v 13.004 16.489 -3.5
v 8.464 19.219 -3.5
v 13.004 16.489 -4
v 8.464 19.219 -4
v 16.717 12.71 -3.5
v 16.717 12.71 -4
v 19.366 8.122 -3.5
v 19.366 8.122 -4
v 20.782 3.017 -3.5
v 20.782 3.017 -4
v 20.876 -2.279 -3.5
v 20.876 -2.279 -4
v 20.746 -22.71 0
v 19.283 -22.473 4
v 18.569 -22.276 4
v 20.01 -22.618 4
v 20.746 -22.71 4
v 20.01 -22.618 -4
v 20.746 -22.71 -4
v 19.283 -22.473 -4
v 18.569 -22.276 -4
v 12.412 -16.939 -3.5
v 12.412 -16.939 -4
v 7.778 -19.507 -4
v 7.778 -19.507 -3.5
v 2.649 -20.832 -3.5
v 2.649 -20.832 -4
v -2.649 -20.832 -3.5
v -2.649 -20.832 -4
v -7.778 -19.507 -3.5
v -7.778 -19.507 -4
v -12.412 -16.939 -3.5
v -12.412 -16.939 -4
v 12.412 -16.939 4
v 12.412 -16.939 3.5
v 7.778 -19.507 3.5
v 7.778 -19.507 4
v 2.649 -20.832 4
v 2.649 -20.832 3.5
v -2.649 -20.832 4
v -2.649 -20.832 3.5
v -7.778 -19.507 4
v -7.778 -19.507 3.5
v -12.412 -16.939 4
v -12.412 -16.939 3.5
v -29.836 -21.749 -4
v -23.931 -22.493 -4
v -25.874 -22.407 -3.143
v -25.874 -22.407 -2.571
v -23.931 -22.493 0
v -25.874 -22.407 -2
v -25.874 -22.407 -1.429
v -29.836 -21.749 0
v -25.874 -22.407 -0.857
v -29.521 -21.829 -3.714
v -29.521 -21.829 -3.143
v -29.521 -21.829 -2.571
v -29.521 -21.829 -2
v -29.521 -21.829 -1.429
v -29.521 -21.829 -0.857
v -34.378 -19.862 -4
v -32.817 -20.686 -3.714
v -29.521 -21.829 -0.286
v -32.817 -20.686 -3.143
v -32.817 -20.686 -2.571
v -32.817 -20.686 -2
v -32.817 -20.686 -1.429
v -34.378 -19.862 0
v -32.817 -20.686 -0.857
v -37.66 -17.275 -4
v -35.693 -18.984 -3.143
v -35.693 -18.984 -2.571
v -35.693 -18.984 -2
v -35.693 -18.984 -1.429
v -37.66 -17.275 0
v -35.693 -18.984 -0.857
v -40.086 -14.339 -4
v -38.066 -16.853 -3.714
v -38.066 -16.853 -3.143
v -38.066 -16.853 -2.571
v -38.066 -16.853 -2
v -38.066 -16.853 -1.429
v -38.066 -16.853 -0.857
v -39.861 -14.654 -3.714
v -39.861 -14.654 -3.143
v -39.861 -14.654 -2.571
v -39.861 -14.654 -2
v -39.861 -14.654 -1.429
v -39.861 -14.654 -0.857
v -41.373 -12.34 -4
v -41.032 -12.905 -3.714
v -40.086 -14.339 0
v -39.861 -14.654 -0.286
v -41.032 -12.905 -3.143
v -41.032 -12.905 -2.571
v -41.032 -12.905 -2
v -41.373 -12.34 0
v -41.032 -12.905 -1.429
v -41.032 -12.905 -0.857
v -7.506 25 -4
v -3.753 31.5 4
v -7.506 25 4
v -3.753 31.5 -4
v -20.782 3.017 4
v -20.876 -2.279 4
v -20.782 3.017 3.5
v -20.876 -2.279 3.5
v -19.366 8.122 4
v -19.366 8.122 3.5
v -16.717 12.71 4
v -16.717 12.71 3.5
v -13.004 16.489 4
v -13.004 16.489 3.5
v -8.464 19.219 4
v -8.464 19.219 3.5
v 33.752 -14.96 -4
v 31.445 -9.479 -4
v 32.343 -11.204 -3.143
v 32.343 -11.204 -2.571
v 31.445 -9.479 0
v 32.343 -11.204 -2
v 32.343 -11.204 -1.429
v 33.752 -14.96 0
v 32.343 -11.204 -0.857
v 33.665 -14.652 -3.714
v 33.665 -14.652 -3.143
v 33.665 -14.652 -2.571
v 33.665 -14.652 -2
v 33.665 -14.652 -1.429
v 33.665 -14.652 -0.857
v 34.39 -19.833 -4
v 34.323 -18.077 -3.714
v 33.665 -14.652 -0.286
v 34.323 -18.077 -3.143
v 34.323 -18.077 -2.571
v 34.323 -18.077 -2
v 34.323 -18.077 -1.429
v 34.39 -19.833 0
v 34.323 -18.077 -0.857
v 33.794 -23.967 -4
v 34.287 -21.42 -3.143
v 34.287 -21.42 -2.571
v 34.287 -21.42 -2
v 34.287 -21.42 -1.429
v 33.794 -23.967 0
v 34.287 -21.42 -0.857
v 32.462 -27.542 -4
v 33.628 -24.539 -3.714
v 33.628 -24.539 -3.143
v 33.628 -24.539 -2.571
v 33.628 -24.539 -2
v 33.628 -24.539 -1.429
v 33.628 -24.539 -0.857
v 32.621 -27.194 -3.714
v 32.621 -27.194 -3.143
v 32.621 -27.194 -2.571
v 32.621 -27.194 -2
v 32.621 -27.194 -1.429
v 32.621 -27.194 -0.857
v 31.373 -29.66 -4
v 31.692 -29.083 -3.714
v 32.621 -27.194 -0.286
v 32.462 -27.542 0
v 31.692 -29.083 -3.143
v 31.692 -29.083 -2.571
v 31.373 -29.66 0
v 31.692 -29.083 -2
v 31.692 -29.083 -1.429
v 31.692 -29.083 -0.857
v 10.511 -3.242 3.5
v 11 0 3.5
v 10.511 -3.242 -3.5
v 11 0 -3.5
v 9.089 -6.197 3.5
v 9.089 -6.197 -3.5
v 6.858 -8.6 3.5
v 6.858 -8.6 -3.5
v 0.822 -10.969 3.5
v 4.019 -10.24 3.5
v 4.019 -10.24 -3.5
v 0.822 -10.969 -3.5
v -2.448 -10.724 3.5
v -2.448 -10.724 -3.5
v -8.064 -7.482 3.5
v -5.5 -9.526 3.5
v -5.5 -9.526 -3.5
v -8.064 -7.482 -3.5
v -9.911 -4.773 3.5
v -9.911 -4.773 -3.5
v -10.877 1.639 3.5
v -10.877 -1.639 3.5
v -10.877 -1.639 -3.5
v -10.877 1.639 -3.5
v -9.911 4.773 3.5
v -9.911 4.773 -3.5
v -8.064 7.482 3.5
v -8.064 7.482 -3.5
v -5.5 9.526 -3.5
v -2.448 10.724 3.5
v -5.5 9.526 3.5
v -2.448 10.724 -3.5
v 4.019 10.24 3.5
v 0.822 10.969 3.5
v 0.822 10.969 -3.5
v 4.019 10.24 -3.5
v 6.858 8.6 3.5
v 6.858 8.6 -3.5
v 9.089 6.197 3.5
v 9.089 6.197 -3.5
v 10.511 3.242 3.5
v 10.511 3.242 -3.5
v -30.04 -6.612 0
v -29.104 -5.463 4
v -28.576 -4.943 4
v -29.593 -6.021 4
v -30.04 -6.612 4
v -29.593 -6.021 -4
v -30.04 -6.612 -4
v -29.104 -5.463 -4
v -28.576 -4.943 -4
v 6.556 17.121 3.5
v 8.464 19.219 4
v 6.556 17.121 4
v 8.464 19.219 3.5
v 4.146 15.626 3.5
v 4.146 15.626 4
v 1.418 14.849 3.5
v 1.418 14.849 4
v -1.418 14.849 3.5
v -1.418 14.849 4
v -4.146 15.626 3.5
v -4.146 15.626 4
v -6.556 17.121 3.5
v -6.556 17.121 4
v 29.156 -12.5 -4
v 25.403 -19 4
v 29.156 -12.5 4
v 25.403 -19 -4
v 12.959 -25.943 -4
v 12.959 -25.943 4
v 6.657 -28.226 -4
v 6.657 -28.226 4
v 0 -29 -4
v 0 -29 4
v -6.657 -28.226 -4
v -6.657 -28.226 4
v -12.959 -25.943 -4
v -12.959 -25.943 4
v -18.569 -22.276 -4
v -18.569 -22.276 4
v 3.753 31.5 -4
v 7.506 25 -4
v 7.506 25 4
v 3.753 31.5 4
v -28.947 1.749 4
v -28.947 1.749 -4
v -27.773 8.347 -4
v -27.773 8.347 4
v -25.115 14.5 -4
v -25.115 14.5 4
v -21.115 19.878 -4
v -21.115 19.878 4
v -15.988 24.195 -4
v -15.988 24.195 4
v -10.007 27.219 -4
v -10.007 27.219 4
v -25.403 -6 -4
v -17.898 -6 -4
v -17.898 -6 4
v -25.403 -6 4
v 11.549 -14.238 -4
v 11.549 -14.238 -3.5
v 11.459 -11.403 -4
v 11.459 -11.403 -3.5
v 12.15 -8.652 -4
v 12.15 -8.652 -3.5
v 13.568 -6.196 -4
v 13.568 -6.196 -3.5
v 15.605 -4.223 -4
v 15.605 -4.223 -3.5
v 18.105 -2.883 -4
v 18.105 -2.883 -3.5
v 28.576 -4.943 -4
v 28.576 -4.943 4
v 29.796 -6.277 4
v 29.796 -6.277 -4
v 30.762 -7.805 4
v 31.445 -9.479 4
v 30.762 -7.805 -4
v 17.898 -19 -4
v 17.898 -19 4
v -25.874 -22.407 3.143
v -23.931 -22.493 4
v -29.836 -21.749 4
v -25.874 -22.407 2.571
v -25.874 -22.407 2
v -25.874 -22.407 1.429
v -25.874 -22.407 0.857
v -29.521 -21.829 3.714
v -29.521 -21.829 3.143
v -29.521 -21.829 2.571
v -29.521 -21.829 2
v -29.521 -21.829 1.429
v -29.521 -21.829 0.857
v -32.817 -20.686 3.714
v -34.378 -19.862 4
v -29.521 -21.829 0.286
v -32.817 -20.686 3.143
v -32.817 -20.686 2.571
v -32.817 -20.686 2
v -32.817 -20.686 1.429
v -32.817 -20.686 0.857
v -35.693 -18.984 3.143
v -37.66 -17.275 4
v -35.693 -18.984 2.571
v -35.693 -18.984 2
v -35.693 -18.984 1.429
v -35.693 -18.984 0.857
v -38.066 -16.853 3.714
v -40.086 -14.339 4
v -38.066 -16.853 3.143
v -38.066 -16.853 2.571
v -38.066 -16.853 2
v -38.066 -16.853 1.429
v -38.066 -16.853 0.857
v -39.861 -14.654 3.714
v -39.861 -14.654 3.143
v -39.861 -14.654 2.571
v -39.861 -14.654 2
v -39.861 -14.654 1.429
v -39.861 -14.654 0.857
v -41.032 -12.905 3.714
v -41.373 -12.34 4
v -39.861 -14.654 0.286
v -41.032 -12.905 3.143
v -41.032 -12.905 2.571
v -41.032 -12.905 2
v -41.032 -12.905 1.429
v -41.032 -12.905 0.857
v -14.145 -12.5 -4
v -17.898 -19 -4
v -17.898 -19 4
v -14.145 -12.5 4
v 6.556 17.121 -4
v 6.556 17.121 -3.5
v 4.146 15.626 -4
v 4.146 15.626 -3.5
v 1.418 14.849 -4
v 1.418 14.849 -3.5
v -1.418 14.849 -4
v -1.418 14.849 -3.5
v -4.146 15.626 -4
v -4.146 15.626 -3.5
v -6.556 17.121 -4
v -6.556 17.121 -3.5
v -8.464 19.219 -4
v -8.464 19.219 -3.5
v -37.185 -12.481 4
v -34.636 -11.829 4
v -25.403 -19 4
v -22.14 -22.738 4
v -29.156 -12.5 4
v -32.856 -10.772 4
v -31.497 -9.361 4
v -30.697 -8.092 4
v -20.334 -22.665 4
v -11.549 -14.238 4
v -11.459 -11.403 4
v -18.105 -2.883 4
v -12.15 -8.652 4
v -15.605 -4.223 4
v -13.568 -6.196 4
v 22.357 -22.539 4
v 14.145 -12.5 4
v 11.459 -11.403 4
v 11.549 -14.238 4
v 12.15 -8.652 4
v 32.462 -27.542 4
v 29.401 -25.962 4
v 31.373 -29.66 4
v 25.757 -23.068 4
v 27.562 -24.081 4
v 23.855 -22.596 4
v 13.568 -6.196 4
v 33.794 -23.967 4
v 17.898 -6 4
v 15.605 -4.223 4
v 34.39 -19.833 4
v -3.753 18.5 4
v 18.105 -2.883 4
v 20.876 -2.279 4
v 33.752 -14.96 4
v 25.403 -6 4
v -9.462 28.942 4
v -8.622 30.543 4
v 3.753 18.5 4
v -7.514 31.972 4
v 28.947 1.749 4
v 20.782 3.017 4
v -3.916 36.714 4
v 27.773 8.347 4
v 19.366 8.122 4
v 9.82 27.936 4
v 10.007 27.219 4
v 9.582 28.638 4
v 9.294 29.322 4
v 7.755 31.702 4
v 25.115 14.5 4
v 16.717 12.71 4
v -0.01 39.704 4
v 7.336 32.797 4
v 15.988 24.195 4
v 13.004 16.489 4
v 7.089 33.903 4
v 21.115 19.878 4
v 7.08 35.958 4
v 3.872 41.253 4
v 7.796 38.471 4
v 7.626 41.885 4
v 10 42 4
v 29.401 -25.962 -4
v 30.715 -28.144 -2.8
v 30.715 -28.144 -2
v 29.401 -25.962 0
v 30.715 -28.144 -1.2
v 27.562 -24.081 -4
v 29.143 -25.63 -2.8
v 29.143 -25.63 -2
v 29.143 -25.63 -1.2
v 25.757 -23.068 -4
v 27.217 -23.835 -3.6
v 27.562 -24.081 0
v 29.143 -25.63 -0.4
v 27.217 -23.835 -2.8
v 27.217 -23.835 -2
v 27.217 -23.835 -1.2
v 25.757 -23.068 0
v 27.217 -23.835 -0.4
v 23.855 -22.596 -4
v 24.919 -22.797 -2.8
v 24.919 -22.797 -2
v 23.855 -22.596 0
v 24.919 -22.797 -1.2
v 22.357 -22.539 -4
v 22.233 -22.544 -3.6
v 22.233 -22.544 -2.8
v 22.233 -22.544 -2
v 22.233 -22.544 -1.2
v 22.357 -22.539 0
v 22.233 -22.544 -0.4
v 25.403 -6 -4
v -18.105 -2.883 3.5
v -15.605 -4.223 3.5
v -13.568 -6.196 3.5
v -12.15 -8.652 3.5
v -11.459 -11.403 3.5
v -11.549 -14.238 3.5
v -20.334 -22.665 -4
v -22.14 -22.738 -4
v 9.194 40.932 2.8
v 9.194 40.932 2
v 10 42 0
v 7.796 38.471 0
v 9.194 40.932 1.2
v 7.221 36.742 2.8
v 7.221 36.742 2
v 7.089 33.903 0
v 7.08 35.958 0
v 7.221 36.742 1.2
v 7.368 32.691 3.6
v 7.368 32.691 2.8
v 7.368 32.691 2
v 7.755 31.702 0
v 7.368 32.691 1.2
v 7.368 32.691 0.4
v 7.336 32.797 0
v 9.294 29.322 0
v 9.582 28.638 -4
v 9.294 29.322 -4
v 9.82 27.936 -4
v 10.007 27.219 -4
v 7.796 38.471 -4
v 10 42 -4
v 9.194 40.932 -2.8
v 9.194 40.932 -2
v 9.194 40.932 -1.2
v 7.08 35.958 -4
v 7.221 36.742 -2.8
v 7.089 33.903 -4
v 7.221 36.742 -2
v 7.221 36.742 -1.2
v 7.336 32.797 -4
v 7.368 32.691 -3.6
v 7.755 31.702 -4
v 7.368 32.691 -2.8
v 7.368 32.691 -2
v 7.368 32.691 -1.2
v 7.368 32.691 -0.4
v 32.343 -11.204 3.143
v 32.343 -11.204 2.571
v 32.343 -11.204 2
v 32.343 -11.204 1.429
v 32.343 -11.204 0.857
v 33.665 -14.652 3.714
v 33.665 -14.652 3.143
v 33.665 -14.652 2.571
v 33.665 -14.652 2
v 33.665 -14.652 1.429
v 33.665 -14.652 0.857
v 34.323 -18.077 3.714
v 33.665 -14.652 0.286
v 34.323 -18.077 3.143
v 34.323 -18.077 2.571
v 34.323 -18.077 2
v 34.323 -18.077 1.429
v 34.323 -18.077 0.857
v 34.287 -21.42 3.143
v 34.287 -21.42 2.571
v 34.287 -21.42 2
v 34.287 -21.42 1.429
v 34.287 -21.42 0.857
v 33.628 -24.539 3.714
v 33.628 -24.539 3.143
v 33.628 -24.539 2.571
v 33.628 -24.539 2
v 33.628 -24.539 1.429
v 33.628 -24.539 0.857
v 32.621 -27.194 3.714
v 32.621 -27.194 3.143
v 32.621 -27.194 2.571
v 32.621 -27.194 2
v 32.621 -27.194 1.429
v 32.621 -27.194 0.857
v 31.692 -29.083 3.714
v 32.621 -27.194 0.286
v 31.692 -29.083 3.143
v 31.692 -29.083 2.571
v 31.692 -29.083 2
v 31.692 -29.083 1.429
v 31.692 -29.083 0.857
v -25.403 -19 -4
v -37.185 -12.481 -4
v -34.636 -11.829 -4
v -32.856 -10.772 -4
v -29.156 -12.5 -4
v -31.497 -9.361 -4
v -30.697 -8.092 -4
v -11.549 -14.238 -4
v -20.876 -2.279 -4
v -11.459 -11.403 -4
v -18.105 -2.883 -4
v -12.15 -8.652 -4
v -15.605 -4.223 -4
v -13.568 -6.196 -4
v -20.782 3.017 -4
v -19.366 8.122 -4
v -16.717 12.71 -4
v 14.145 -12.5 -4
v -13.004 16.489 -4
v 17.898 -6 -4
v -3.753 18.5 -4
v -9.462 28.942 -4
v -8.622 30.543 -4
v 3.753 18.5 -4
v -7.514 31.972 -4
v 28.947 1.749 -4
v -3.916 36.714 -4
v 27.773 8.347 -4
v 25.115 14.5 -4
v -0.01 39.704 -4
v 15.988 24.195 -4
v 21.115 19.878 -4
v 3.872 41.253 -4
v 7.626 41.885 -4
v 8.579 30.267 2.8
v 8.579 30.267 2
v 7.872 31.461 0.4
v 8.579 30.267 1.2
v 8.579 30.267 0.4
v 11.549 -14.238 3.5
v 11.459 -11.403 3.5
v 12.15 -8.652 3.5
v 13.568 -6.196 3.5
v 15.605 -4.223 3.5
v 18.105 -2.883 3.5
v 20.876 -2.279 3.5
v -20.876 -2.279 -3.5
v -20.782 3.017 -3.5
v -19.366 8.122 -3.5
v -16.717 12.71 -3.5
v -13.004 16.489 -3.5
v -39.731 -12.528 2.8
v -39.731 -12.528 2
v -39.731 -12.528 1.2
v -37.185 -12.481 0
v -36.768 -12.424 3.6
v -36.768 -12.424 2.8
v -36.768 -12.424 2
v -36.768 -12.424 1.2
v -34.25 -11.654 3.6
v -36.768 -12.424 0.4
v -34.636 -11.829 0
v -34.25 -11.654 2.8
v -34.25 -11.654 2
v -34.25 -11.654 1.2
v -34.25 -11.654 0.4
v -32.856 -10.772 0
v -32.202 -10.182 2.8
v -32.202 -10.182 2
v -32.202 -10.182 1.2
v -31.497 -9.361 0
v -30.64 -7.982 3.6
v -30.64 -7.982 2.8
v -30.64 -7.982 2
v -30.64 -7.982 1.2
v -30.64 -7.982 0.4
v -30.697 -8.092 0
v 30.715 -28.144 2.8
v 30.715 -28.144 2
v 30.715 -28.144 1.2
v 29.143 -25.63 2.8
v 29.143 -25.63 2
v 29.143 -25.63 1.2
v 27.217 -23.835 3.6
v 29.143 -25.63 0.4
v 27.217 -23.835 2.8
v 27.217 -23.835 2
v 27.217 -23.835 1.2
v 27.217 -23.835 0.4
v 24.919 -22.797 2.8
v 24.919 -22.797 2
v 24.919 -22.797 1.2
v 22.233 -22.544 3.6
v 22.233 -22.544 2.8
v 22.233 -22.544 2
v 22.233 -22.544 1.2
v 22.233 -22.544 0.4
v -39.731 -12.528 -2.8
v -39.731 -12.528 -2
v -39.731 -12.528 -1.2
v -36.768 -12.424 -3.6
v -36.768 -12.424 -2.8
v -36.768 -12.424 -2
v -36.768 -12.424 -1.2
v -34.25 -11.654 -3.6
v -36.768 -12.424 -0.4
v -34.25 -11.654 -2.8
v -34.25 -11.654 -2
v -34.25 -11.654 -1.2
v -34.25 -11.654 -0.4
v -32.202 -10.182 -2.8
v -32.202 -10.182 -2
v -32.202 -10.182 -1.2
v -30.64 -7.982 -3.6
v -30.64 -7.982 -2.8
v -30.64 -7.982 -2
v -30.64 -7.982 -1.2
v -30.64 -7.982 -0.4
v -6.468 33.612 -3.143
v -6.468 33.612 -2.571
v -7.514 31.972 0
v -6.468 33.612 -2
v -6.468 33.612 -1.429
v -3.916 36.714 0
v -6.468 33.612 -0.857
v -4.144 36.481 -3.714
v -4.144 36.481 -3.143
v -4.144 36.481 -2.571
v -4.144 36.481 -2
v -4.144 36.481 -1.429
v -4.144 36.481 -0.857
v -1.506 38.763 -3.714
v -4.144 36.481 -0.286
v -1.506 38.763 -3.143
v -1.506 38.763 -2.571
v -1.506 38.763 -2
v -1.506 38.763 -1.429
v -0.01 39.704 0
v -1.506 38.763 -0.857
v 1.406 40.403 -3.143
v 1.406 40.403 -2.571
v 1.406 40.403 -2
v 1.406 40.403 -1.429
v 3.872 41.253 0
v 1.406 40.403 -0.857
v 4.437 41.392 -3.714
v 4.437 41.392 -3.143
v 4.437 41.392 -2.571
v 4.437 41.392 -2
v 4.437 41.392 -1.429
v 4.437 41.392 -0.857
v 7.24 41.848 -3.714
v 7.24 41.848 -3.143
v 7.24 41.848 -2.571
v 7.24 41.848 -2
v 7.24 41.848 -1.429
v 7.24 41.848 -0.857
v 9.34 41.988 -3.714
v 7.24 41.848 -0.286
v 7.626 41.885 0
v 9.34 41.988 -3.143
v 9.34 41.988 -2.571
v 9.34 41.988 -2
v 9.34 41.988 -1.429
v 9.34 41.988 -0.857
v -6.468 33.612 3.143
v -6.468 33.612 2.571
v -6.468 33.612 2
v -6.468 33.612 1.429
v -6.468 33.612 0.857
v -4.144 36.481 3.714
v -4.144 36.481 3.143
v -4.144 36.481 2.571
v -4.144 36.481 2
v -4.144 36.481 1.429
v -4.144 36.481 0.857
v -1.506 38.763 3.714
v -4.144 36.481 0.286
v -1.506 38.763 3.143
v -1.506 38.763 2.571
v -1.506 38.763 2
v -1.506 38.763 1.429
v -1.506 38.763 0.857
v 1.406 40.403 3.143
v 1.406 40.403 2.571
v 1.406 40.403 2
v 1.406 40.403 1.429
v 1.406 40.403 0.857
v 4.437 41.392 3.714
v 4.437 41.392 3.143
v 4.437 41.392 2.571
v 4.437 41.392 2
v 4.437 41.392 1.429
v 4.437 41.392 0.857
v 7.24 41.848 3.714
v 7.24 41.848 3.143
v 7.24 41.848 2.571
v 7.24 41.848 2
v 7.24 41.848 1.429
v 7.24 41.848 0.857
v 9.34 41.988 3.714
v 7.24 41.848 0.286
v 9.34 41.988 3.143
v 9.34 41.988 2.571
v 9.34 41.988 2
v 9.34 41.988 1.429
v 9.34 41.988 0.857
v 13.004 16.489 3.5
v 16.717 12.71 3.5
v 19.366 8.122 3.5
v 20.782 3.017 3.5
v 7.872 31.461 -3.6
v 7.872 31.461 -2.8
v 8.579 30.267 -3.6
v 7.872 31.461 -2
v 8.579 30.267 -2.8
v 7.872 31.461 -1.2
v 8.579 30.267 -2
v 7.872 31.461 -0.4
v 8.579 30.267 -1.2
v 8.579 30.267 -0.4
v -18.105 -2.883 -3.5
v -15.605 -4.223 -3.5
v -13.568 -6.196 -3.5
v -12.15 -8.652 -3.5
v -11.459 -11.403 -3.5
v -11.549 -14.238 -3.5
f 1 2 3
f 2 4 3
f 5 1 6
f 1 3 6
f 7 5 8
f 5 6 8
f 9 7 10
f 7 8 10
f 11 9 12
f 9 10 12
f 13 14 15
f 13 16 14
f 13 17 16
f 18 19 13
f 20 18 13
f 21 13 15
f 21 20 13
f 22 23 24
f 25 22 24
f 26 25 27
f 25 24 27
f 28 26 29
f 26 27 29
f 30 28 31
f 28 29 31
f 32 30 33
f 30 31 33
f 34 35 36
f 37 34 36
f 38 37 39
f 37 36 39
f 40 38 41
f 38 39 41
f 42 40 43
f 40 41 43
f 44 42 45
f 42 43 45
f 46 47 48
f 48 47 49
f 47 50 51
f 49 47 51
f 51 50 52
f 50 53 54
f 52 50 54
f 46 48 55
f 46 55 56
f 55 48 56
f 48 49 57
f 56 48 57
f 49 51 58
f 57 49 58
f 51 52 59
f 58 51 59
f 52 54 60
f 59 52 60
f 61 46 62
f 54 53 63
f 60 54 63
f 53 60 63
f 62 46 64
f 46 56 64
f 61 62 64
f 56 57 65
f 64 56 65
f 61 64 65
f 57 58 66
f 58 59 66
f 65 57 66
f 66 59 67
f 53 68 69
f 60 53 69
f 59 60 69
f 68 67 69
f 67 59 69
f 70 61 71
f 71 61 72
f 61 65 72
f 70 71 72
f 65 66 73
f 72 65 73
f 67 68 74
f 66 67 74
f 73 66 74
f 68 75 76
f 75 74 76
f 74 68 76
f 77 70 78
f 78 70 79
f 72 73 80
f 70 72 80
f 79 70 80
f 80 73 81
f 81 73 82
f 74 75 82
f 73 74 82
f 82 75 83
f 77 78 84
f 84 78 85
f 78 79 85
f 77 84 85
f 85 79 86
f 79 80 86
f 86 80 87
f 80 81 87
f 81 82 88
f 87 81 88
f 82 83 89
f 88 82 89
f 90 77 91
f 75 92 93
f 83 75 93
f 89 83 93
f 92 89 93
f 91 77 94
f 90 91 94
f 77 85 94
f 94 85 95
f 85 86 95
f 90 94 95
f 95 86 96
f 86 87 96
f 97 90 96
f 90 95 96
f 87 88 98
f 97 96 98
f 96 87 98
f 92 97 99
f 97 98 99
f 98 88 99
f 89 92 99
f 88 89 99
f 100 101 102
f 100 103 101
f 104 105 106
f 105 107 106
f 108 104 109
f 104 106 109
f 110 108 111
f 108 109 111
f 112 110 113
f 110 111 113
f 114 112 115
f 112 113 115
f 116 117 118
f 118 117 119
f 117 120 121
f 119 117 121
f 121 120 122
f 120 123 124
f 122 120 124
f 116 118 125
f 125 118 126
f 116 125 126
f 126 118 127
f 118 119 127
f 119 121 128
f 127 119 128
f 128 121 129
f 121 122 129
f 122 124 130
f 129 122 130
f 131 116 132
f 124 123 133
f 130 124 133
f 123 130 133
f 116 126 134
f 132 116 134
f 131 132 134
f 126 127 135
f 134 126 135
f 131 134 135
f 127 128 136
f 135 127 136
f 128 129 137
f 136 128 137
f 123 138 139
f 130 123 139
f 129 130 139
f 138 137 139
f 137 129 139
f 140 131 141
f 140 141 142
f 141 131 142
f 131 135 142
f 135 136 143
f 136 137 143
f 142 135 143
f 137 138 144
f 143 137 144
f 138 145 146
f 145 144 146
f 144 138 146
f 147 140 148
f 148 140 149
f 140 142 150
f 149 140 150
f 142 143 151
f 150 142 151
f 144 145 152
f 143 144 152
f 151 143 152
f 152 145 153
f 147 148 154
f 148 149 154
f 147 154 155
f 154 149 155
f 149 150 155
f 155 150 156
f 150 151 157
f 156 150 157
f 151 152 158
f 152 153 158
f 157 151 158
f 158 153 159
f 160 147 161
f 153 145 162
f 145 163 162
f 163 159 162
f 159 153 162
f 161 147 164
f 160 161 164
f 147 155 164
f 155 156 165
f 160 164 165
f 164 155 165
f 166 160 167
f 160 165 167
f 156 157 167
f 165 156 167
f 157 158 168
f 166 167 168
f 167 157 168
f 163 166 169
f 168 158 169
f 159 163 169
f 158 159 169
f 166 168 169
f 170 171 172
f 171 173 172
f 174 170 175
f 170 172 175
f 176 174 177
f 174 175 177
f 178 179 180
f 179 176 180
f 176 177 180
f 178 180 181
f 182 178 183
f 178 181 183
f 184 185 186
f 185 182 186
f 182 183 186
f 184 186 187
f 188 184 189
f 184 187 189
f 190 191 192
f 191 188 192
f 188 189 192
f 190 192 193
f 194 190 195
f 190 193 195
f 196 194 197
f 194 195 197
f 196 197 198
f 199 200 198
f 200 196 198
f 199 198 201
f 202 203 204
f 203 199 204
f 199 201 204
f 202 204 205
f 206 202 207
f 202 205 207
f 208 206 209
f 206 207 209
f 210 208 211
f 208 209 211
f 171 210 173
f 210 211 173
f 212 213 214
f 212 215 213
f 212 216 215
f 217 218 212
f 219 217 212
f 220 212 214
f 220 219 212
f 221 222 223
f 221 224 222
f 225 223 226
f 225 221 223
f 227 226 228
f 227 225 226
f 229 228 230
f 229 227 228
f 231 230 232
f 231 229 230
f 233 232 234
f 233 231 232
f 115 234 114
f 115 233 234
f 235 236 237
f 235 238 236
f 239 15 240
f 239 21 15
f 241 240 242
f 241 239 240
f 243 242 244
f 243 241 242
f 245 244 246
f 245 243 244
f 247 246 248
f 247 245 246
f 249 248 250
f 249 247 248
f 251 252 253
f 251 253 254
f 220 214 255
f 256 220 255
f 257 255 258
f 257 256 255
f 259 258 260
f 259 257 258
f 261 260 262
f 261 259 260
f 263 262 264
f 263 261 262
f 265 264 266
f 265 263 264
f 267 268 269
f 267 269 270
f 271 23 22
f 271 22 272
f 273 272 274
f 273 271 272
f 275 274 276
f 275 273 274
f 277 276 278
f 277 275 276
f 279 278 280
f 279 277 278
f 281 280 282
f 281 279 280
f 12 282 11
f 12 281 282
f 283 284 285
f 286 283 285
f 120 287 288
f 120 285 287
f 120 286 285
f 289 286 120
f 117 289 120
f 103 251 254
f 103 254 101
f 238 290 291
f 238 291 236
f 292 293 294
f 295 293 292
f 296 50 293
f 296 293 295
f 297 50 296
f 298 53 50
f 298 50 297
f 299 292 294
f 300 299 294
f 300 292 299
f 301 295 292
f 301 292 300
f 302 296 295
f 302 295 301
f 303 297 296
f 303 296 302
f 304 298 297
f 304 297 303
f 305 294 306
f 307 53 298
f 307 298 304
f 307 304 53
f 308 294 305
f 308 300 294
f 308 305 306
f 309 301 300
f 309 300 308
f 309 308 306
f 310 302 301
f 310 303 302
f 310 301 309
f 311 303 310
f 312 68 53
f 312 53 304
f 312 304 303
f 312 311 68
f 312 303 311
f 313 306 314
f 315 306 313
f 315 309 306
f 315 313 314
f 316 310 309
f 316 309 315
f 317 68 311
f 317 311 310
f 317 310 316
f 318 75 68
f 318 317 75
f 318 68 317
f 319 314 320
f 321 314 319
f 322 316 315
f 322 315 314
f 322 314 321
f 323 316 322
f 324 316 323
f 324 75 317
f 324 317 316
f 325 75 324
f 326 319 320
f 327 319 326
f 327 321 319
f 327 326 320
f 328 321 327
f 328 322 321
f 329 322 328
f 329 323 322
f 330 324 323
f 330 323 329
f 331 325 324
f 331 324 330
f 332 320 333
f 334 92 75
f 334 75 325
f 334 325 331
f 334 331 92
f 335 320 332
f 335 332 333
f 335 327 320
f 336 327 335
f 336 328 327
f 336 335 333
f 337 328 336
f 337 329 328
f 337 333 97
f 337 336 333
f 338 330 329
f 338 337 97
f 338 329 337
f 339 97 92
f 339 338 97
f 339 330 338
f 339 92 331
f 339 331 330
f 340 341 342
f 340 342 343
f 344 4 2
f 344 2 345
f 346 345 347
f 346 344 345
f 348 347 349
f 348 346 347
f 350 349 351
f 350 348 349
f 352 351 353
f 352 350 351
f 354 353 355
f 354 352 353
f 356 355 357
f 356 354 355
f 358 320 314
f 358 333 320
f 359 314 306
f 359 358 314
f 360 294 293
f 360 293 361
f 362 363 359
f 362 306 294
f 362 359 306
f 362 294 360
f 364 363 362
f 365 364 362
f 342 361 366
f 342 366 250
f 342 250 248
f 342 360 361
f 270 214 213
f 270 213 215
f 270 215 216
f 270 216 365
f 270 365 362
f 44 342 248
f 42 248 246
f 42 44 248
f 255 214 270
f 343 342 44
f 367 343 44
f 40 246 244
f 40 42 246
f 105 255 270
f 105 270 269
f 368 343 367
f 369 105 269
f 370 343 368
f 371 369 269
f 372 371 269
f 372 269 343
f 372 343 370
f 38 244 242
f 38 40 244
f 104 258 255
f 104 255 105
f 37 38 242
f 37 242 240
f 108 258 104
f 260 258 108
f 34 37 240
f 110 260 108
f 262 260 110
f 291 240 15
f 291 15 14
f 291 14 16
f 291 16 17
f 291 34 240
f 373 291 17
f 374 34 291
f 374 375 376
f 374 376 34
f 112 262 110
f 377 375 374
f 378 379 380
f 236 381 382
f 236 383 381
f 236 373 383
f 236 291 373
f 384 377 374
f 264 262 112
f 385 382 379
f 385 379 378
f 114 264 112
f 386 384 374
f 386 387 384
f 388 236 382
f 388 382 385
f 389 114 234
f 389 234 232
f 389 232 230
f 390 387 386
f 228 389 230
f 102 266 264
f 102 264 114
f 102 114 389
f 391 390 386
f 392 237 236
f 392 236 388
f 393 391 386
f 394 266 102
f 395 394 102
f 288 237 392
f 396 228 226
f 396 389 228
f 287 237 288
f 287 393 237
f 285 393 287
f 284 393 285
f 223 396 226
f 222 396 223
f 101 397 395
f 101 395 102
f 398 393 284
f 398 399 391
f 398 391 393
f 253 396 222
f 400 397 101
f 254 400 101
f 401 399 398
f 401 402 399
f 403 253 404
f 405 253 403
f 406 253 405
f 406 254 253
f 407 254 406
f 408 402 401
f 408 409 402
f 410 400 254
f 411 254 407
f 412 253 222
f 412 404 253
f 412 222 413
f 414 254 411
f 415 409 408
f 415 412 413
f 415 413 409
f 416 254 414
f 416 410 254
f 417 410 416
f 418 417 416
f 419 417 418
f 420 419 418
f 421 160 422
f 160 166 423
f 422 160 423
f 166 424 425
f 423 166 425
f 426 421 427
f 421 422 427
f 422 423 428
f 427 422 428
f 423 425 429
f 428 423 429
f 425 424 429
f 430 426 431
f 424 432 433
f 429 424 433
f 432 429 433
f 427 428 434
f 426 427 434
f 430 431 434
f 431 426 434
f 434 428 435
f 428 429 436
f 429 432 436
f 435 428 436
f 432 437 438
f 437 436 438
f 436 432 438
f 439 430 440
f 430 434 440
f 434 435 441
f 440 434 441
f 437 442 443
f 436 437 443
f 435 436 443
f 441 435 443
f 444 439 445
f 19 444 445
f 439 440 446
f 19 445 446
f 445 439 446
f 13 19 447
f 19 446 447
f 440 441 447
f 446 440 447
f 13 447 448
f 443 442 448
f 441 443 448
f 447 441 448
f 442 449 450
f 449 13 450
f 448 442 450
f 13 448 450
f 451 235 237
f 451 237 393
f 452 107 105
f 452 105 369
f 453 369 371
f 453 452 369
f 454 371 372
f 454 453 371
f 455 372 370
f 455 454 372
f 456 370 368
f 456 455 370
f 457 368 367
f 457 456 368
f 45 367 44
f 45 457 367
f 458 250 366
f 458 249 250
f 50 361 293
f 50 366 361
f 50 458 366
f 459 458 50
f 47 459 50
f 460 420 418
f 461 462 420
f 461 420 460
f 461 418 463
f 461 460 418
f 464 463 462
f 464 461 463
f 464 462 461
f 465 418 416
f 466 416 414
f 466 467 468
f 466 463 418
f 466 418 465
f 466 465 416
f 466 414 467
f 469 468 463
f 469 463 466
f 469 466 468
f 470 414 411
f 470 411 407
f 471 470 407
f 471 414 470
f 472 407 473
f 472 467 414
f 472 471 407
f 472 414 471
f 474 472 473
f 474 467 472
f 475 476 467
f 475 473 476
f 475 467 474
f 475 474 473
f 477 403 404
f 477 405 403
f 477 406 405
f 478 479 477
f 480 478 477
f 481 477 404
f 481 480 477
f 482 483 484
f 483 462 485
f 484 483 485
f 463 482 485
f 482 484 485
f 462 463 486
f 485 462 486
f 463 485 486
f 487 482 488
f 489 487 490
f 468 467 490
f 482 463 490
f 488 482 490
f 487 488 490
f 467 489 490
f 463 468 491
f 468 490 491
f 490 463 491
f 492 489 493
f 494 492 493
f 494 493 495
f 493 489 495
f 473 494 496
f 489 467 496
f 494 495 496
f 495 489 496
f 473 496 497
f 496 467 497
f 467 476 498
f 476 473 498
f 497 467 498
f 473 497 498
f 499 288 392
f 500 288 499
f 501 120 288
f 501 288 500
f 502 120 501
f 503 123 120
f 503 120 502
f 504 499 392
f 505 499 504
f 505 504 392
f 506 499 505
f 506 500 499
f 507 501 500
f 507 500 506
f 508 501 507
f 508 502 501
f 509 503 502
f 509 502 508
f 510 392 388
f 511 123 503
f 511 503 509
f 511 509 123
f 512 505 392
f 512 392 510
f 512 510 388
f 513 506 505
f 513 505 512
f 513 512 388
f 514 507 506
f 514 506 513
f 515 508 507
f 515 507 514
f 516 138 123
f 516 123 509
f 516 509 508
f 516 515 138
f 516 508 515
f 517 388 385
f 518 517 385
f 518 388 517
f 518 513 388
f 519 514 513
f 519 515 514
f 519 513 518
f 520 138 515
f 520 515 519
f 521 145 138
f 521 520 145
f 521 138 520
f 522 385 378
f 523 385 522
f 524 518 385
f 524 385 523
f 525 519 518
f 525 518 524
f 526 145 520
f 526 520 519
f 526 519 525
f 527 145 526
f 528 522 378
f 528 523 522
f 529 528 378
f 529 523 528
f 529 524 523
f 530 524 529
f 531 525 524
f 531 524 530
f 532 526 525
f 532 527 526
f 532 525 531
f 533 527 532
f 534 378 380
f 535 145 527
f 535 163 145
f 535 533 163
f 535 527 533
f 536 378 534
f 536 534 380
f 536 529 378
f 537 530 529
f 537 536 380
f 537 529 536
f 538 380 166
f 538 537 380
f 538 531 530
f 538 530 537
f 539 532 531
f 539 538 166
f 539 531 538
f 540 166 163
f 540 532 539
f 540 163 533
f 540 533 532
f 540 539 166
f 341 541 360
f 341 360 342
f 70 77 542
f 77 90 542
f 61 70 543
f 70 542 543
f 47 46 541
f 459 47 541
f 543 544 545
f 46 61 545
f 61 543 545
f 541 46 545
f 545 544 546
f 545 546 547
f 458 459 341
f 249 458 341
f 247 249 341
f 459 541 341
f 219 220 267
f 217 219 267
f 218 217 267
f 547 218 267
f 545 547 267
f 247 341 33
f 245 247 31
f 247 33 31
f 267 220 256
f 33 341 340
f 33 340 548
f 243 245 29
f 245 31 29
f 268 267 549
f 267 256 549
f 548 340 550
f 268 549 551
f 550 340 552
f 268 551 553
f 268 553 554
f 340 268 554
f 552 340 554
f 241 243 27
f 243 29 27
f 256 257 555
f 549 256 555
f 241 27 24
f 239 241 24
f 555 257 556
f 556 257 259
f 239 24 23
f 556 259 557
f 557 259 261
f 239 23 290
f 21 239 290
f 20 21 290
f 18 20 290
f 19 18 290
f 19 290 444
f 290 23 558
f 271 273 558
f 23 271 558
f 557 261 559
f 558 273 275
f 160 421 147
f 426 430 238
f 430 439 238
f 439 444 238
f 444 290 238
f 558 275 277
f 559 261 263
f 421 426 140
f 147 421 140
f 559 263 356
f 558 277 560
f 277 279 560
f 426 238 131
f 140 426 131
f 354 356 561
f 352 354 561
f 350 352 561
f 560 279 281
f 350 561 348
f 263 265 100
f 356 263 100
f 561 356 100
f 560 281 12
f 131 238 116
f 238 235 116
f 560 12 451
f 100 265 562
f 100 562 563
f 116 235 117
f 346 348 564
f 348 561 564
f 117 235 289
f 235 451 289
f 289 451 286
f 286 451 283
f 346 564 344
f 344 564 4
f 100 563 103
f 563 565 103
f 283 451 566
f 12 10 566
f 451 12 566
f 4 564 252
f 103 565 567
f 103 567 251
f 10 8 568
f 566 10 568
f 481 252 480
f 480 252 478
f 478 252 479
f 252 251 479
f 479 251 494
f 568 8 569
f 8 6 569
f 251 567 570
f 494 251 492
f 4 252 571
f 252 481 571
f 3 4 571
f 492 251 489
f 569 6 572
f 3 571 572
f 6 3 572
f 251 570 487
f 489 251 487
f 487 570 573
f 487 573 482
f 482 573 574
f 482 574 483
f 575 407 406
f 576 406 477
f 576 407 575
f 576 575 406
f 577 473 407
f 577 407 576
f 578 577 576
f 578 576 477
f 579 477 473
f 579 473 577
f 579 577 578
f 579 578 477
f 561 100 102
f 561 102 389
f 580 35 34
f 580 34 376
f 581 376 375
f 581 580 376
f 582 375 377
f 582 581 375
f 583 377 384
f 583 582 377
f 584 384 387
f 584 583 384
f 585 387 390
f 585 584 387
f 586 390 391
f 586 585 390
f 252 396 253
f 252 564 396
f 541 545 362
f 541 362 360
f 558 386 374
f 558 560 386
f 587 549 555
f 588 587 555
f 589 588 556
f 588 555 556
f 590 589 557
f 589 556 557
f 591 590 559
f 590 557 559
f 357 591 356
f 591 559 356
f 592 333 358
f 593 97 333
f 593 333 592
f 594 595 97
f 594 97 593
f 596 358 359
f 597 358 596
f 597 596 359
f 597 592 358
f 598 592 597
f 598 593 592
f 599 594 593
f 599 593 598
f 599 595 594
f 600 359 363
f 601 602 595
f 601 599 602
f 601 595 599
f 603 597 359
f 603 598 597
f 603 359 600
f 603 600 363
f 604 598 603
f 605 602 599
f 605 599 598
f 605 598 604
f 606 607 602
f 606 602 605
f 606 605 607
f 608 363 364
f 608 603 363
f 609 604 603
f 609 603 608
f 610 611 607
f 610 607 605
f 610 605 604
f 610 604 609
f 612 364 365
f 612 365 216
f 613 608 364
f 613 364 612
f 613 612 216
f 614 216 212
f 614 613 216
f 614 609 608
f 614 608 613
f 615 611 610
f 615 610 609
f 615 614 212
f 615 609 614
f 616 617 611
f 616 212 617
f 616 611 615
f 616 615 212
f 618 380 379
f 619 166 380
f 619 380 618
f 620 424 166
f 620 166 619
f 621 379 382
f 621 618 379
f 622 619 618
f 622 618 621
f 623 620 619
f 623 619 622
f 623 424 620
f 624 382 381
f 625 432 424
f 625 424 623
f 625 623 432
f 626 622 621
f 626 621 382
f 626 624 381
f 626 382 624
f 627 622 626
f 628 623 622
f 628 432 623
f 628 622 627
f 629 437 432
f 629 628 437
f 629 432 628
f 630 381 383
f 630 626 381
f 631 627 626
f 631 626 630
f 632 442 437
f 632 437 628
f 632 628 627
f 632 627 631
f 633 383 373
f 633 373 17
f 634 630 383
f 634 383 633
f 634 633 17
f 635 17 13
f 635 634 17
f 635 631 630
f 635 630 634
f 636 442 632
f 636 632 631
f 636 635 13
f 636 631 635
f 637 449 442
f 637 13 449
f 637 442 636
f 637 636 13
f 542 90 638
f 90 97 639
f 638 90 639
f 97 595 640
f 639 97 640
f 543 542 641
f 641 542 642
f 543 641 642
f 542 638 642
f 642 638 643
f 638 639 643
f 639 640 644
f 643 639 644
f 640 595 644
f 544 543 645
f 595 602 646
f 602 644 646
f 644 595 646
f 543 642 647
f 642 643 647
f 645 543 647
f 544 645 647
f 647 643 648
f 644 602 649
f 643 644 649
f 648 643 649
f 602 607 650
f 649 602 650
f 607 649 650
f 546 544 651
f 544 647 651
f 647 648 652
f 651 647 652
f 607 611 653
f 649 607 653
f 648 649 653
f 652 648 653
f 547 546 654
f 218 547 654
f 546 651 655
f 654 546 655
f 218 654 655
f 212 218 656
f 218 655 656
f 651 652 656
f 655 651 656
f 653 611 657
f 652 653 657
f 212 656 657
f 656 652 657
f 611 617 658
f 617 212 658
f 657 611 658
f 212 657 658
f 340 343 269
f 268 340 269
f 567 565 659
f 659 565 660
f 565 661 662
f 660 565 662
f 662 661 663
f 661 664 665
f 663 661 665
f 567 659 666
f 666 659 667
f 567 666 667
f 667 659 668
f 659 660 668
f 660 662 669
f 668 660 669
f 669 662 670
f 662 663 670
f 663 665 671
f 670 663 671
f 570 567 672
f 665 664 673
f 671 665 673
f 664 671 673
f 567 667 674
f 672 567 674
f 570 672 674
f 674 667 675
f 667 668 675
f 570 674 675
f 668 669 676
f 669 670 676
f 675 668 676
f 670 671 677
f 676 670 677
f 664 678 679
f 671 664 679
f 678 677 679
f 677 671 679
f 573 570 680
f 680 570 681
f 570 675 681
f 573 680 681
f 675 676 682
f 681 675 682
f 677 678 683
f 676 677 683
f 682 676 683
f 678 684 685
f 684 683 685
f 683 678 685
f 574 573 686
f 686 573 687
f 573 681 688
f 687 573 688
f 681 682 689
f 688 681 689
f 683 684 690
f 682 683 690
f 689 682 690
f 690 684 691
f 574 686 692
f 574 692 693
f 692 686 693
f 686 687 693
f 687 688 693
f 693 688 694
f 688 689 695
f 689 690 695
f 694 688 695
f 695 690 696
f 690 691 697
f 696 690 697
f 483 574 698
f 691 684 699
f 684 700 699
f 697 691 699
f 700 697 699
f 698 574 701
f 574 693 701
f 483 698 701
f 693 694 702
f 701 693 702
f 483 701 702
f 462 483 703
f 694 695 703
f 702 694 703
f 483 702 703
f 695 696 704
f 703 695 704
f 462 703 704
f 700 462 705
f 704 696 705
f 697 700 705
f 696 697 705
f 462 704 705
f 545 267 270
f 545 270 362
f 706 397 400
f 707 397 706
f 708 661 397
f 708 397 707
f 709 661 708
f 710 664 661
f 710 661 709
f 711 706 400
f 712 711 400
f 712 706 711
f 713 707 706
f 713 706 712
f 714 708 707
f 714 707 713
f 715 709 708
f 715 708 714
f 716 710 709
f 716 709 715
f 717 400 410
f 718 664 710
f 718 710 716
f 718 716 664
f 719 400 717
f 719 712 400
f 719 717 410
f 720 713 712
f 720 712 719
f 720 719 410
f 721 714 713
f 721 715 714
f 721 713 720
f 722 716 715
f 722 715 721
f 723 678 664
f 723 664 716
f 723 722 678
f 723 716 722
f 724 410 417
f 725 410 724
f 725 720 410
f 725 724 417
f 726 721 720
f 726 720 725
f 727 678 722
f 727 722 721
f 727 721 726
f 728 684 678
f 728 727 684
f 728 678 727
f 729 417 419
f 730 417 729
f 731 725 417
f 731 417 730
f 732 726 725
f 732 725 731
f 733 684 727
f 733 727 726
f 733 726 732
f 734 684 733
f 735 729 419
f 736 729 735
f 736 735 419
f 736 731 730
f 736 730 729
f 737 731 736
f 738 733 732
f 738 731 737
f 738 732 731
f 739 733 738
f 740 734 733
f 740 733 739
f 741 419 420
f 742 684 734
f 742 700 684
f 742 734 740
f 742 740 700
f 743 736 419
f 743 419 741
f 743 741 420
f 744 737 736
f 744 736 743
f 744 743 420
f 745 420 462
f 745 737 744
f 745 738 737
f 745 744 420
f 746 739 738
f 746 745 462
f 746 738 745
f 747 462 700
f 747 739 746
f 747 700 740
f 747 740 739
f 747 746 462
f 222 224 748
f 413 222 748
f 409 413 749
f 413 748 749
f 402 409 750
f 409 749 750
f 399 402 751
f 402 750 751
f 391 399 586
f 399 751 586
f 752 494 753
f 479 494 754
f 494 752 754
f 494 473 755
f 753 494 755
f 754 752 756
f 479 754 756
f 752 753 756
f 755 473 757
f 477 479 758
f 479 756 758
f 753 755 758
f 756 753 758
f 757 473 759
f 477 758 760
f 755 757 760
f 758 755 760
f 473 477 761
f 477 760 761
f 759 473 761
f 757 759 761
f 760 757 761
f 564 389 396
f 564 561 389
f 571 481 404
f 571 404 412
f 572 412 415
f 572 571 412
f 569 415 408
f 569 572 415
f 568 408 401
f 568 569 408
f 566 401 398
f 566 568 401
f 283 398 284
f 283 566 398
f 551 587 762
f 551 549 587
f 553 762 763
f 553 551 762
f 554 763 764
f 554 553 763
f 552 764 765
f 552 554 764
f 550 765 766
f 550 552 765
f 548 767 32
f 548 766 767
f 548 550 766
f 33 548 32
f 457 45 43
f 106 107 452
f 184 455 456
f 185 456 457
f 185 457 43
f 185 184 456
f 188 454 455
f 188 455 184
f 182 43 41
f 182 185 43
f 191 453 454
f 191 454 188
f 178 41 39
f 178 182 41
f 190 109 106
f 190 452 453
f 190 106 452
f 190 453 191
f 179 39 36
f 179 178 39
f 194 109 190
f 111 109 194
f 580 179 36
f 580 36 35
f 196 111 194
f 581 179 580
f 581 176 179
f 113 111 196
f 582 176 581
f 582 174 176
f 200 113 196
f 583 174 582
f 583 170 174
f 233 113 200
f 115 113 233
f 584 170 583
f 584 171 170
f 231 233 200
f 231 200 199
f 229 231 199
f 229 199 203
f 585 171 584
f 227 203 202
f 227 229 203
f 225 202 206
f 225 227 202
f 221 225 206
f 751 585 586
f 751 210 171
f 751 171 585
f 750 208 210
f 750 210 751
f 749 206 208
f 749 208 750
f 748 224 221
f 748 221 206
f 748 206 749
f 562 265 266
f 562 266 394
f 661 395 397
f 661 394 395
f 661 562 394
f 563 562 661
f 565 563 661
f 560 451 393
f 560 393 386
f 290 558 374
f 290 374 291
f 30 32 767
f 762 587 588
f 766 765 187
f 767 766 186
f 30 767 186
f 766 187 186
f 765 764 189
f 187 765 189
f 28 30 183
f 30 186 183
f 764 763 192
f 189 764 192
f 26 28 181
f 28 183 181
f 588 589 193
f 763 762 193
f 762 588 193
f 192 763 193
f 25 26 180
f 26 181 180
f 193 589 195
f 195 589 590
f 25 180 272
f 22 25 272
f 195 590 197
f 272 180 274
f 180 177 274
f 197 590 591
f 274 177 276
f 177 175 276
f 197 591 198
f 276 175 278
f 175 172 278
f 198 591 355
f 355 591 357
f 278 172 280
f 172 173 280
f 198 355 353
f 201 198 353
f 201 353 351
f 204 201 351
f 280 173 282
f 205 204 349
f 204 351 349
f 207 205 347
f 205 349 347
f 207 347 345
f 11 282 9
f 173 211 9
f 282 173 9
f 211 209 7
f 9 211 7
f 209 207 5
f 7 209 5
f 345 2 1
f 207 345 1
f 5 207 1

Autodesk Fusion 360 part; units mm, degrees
sketch "Sketch1" plane through (0, 0, 0) normal (0, 0, 1) x (1, 0, 0) in component "Figet Spinner"
  circle A0 centre (0, 0) radius 25 construction
  line L0 (0, 0) -> (0, 37) construction
  line L1 (-3.7528, 31.5) -> (-7.5056, 25)
  line L2 (-7.5056, 25) -> (-3.7528, 18.5)
  line L3 (-3.7528, 18.5) -> (3.7528, 18.5)
  line L4 (3.7528, 18.5) -> (7.5056, 25)
  line L5 (7.5056, 25) -> (3.7528, 31.5)
  line L6 (3.7528, 31.5) -> (-3.7528, 31.5)
  spline S0 degree 5 poles (-7.5138, 31.9717) (-7.2318, 32.4496) (-6.6528, 33.3792) (-5.7393, 34.6951) (-4.4298, 36.2901) (-2.6362, 38.0009) (-0.6893, 39.4059) (1.3878, 40.4856) (3.5405, 41.2348) (5.6614, 41.6834) (7.5834, 41.9073) (8.8194, 41.9749) (9.5098, 41.9954) (9.8557, 42) (10, 42) knots 0 0 0 0 0 0 0.1 0.2 0.3 0.4 0.5 0.6 0.7 0.8 0.9 1 1 1 1 1 1
  line L7 (9, 42) -> (11, 42)
  spline S1 degree 5 poles (10, 42) (9.5694, 41.4679) (8.784, 40.4086) (7.8329, 38.8347) (7.0266, 36.7666) (6.8325, 34.2352) (7.3693, 32.2479) (8.175, 30.7821) (8.8868, 29.8139) (9.2884, 29.3289) (9.2944, 29.3216) knots 0 0 0 0 0 0 0.1 0.2 0.3 0.4 0.5 0.501529 0.501529 0.501529 0.501529 0.501529 0.501529
  line L8 (8.3624, 30.4454) -> (10.2264, 28.1979)
  circle A1 centre (0, 0) radius 11
  spline S2 degree 5 poles (-23.9314, -22.493) (-24.4863, -22.4877) (-25.5808, -22.451) (-27.1772, -22.3179) (-29.2133, -21.9813) (-31.5916, -21.2835) (-33.7818, -20.2999) (-35.7555, -19.0409) (-37.4806, -17.5512) (-38.9296, -15.9388) (-40.0844, -14.3862) (-40.7611, -13.3496) (-41.124, -12.762) (-41.3009, -12.4647) (-41.3731, -12.3397) knots 0 0 0 0 0 0 0.1 0.2 0.3 0.4 0.5 0.6 0.7 0.8 0.9 1 1 1 1 1 1
  spline S3 degree 5 poles (-41.3731, -12.3397) (-40.6969, -12.4466) (-39.3869, -12.5972) (-37.5483, -12.6339) (-35.3541, -12.2981) (-33.0648, -11.2004) (-31.6122, -9.742) (-30.7456, -8.3113) (-30.263, -7.2107) (-30.0438, -6.6205) (-30.0405, -6.6116) knots 0 0 0 0 0 0 0.1 0.2 0.3 0.4 0.5 0.501529 0.501529 0.501529 0.501529 0.501529 0.501529
  line L9 (-25.4034, -6) -> (-29.1562, -12.5)
  line L10 (-29.1562, -12.5) -> (-25.4034, -19)
  line L11 (-25.4034, -19) -> (-17.8979, -19)
  line L12 (-17.8979, -19) -> (-14.1451, -12.5)
  line L13 (-14.1451, -12.5) -> (-17.8979, -6)
  line L14 (-17.8979, -6) -> (-25.4034, -6)
  spline S4 degree 5 poles (31.4452, -9.4787) (31.7181, -9.9619) (32.2336, -10.9281) (32.9164, -12.3772) (33.643, -14.3087) (34.2278, -16.7174) (34.4712, -19.106) (34.3677, -21.4447) (33.9401, -23.6836) (33.2682, -25.7446) (32.5011, -27.521) (31.9416, -28.6253) (31.6142, -29.2335) (31.4452, -29.5353) (31.3731, -29.6603) knots 0 0 0 0 0 0 0.1 0.2 0.3 0.4 0.5 0.6 0.7 0.8 0.9 1 1 1 1 1 1
  spline S5 degree 5 poles (31.3731, -29.6603) (31.1275, -29.0213) (30.6029, -27.8115) (29.7154, -26.2009) (28.3275, -24.4685) (26.2323, -23.0347) (24.2429, -22.506) (22.5706, -22.4708) (21.3762, -22.6032) (20.7554, -22.7084) (20.7461, -22.71) knots 0 0 0 0 0 0 0.1 0.2 0.3 0.4 0.5 0.501529 0.501529 0.501529 0.501529 0.501529 0.501529
  line L15 (17.8979, -19) -> (25.4034, -19)
  line L16 (25.4034, -19) -> (29.1562, -12.5)
  line L17 (29.1562, -12.5) -> (25.4034, -6)
  line L18 (25.4034, -6) -> (17.8979, -6)
  line L19 (17.8979, -6) -> (14.1451, -12.5)
  line L20 (14.1451, -12.5) -> (17.8979, -19)
  arc A2 (-8.464, 19.2188) -> (-20.8759, -2.2793) centre (0, 0) ccw
  arc A3 (-12.4119, -16.9394) -> (12.4119, -16.9394) centre (0, 0) ccw
  arc A4 (20.8759, -2.2793) -> (8.464, 19.2188) centre (0, 0) ccw
  arc A5 (-18.5686, -22.2757) -> (18.5686, -22.2757) centre (0, 0) ccw
  arc A6 (28.5756, -4.9431) -> (10.007, 27.2188) centre (0, 0) ccw
  arc A7 (-8.464, 19.2188) -> (8.464, 19.2188) centre (0, 25) ccw
  arc A8 (-7.5138, 31.9717) -> (-10.007, 27.2187) centre (0, 25) ccw
  arc A9 (18.5686, -22.2757) -> (20.7461, -22.71) centre (21.6506, -12.5) ccw
  arc A10 (31.4452, -9.4787) -> (28.5756, -4.9431) centre (21.6506, -12.5) ccw
  arc A11 (20.8759, -2.2793) -> (12.4119, -16.9394) centre (21.6506, -12.5) ccw
  arc A12 (-10.007, 27.2187) -> (-28.5756, -4.9431) centre (0, 0) ccw
  arc A13 (-28.5756, -4.9431) -> (-30.0405, -6.6116) centre (-21.6506, -12.5) ccw
  arc A14 (-23.9314, -22.493) -> (-18.5686, -22.2757) centre (-21.6506, -12.5) ccw
  arc A15 (-12.4119, -16.9394) -> (-20.8759, -2.2793) centre (-21.6506, -12.5) ccw
  arc A16 (10.007, 27.2187) -> (9.2944, 29.3217) centre (0, 25) ccw
  arc A17 (7.7553, 31.702) -> (7.7553, 31.702) centre (0, 25) ccw
  point P0 (0, 25)
  point P1 (3, 41)
  point P2 (-37.007, -17.9019)
  point P3 (-31.3324, -9.1347)
  point P4 (34.007, -23.0981)
  point P5 (23.5771, -22.5673)
  dimension "d14" = 50
  dimension "d15" = 6.5
  dimension "d16" = 31.5
  dimension "d17" = 20.5
  dimension "d18" = 22
extrude "Extrude2" add sketch "Sketch1" along normal mid plane 8 contours S1 A7 A8 A16 A17 | S0 S1 A17 | S2 S3 S4 S5 A2 A3 A4 A5 A6 A9 A10 A11 A12 A13 A14 A15 A17 in component "Figet Spinner"
extrude "Extrude3" add sketch "Sketch1" along normal mid plane 7 contours A2 A3 A4 A7 A11 A15 A17 in component "Figet Spinner"
component "Figet Spinner" placed x (1, 0, 0) y (0, 1, 0) z (0, 0, 1) at (0, 0, 0)
